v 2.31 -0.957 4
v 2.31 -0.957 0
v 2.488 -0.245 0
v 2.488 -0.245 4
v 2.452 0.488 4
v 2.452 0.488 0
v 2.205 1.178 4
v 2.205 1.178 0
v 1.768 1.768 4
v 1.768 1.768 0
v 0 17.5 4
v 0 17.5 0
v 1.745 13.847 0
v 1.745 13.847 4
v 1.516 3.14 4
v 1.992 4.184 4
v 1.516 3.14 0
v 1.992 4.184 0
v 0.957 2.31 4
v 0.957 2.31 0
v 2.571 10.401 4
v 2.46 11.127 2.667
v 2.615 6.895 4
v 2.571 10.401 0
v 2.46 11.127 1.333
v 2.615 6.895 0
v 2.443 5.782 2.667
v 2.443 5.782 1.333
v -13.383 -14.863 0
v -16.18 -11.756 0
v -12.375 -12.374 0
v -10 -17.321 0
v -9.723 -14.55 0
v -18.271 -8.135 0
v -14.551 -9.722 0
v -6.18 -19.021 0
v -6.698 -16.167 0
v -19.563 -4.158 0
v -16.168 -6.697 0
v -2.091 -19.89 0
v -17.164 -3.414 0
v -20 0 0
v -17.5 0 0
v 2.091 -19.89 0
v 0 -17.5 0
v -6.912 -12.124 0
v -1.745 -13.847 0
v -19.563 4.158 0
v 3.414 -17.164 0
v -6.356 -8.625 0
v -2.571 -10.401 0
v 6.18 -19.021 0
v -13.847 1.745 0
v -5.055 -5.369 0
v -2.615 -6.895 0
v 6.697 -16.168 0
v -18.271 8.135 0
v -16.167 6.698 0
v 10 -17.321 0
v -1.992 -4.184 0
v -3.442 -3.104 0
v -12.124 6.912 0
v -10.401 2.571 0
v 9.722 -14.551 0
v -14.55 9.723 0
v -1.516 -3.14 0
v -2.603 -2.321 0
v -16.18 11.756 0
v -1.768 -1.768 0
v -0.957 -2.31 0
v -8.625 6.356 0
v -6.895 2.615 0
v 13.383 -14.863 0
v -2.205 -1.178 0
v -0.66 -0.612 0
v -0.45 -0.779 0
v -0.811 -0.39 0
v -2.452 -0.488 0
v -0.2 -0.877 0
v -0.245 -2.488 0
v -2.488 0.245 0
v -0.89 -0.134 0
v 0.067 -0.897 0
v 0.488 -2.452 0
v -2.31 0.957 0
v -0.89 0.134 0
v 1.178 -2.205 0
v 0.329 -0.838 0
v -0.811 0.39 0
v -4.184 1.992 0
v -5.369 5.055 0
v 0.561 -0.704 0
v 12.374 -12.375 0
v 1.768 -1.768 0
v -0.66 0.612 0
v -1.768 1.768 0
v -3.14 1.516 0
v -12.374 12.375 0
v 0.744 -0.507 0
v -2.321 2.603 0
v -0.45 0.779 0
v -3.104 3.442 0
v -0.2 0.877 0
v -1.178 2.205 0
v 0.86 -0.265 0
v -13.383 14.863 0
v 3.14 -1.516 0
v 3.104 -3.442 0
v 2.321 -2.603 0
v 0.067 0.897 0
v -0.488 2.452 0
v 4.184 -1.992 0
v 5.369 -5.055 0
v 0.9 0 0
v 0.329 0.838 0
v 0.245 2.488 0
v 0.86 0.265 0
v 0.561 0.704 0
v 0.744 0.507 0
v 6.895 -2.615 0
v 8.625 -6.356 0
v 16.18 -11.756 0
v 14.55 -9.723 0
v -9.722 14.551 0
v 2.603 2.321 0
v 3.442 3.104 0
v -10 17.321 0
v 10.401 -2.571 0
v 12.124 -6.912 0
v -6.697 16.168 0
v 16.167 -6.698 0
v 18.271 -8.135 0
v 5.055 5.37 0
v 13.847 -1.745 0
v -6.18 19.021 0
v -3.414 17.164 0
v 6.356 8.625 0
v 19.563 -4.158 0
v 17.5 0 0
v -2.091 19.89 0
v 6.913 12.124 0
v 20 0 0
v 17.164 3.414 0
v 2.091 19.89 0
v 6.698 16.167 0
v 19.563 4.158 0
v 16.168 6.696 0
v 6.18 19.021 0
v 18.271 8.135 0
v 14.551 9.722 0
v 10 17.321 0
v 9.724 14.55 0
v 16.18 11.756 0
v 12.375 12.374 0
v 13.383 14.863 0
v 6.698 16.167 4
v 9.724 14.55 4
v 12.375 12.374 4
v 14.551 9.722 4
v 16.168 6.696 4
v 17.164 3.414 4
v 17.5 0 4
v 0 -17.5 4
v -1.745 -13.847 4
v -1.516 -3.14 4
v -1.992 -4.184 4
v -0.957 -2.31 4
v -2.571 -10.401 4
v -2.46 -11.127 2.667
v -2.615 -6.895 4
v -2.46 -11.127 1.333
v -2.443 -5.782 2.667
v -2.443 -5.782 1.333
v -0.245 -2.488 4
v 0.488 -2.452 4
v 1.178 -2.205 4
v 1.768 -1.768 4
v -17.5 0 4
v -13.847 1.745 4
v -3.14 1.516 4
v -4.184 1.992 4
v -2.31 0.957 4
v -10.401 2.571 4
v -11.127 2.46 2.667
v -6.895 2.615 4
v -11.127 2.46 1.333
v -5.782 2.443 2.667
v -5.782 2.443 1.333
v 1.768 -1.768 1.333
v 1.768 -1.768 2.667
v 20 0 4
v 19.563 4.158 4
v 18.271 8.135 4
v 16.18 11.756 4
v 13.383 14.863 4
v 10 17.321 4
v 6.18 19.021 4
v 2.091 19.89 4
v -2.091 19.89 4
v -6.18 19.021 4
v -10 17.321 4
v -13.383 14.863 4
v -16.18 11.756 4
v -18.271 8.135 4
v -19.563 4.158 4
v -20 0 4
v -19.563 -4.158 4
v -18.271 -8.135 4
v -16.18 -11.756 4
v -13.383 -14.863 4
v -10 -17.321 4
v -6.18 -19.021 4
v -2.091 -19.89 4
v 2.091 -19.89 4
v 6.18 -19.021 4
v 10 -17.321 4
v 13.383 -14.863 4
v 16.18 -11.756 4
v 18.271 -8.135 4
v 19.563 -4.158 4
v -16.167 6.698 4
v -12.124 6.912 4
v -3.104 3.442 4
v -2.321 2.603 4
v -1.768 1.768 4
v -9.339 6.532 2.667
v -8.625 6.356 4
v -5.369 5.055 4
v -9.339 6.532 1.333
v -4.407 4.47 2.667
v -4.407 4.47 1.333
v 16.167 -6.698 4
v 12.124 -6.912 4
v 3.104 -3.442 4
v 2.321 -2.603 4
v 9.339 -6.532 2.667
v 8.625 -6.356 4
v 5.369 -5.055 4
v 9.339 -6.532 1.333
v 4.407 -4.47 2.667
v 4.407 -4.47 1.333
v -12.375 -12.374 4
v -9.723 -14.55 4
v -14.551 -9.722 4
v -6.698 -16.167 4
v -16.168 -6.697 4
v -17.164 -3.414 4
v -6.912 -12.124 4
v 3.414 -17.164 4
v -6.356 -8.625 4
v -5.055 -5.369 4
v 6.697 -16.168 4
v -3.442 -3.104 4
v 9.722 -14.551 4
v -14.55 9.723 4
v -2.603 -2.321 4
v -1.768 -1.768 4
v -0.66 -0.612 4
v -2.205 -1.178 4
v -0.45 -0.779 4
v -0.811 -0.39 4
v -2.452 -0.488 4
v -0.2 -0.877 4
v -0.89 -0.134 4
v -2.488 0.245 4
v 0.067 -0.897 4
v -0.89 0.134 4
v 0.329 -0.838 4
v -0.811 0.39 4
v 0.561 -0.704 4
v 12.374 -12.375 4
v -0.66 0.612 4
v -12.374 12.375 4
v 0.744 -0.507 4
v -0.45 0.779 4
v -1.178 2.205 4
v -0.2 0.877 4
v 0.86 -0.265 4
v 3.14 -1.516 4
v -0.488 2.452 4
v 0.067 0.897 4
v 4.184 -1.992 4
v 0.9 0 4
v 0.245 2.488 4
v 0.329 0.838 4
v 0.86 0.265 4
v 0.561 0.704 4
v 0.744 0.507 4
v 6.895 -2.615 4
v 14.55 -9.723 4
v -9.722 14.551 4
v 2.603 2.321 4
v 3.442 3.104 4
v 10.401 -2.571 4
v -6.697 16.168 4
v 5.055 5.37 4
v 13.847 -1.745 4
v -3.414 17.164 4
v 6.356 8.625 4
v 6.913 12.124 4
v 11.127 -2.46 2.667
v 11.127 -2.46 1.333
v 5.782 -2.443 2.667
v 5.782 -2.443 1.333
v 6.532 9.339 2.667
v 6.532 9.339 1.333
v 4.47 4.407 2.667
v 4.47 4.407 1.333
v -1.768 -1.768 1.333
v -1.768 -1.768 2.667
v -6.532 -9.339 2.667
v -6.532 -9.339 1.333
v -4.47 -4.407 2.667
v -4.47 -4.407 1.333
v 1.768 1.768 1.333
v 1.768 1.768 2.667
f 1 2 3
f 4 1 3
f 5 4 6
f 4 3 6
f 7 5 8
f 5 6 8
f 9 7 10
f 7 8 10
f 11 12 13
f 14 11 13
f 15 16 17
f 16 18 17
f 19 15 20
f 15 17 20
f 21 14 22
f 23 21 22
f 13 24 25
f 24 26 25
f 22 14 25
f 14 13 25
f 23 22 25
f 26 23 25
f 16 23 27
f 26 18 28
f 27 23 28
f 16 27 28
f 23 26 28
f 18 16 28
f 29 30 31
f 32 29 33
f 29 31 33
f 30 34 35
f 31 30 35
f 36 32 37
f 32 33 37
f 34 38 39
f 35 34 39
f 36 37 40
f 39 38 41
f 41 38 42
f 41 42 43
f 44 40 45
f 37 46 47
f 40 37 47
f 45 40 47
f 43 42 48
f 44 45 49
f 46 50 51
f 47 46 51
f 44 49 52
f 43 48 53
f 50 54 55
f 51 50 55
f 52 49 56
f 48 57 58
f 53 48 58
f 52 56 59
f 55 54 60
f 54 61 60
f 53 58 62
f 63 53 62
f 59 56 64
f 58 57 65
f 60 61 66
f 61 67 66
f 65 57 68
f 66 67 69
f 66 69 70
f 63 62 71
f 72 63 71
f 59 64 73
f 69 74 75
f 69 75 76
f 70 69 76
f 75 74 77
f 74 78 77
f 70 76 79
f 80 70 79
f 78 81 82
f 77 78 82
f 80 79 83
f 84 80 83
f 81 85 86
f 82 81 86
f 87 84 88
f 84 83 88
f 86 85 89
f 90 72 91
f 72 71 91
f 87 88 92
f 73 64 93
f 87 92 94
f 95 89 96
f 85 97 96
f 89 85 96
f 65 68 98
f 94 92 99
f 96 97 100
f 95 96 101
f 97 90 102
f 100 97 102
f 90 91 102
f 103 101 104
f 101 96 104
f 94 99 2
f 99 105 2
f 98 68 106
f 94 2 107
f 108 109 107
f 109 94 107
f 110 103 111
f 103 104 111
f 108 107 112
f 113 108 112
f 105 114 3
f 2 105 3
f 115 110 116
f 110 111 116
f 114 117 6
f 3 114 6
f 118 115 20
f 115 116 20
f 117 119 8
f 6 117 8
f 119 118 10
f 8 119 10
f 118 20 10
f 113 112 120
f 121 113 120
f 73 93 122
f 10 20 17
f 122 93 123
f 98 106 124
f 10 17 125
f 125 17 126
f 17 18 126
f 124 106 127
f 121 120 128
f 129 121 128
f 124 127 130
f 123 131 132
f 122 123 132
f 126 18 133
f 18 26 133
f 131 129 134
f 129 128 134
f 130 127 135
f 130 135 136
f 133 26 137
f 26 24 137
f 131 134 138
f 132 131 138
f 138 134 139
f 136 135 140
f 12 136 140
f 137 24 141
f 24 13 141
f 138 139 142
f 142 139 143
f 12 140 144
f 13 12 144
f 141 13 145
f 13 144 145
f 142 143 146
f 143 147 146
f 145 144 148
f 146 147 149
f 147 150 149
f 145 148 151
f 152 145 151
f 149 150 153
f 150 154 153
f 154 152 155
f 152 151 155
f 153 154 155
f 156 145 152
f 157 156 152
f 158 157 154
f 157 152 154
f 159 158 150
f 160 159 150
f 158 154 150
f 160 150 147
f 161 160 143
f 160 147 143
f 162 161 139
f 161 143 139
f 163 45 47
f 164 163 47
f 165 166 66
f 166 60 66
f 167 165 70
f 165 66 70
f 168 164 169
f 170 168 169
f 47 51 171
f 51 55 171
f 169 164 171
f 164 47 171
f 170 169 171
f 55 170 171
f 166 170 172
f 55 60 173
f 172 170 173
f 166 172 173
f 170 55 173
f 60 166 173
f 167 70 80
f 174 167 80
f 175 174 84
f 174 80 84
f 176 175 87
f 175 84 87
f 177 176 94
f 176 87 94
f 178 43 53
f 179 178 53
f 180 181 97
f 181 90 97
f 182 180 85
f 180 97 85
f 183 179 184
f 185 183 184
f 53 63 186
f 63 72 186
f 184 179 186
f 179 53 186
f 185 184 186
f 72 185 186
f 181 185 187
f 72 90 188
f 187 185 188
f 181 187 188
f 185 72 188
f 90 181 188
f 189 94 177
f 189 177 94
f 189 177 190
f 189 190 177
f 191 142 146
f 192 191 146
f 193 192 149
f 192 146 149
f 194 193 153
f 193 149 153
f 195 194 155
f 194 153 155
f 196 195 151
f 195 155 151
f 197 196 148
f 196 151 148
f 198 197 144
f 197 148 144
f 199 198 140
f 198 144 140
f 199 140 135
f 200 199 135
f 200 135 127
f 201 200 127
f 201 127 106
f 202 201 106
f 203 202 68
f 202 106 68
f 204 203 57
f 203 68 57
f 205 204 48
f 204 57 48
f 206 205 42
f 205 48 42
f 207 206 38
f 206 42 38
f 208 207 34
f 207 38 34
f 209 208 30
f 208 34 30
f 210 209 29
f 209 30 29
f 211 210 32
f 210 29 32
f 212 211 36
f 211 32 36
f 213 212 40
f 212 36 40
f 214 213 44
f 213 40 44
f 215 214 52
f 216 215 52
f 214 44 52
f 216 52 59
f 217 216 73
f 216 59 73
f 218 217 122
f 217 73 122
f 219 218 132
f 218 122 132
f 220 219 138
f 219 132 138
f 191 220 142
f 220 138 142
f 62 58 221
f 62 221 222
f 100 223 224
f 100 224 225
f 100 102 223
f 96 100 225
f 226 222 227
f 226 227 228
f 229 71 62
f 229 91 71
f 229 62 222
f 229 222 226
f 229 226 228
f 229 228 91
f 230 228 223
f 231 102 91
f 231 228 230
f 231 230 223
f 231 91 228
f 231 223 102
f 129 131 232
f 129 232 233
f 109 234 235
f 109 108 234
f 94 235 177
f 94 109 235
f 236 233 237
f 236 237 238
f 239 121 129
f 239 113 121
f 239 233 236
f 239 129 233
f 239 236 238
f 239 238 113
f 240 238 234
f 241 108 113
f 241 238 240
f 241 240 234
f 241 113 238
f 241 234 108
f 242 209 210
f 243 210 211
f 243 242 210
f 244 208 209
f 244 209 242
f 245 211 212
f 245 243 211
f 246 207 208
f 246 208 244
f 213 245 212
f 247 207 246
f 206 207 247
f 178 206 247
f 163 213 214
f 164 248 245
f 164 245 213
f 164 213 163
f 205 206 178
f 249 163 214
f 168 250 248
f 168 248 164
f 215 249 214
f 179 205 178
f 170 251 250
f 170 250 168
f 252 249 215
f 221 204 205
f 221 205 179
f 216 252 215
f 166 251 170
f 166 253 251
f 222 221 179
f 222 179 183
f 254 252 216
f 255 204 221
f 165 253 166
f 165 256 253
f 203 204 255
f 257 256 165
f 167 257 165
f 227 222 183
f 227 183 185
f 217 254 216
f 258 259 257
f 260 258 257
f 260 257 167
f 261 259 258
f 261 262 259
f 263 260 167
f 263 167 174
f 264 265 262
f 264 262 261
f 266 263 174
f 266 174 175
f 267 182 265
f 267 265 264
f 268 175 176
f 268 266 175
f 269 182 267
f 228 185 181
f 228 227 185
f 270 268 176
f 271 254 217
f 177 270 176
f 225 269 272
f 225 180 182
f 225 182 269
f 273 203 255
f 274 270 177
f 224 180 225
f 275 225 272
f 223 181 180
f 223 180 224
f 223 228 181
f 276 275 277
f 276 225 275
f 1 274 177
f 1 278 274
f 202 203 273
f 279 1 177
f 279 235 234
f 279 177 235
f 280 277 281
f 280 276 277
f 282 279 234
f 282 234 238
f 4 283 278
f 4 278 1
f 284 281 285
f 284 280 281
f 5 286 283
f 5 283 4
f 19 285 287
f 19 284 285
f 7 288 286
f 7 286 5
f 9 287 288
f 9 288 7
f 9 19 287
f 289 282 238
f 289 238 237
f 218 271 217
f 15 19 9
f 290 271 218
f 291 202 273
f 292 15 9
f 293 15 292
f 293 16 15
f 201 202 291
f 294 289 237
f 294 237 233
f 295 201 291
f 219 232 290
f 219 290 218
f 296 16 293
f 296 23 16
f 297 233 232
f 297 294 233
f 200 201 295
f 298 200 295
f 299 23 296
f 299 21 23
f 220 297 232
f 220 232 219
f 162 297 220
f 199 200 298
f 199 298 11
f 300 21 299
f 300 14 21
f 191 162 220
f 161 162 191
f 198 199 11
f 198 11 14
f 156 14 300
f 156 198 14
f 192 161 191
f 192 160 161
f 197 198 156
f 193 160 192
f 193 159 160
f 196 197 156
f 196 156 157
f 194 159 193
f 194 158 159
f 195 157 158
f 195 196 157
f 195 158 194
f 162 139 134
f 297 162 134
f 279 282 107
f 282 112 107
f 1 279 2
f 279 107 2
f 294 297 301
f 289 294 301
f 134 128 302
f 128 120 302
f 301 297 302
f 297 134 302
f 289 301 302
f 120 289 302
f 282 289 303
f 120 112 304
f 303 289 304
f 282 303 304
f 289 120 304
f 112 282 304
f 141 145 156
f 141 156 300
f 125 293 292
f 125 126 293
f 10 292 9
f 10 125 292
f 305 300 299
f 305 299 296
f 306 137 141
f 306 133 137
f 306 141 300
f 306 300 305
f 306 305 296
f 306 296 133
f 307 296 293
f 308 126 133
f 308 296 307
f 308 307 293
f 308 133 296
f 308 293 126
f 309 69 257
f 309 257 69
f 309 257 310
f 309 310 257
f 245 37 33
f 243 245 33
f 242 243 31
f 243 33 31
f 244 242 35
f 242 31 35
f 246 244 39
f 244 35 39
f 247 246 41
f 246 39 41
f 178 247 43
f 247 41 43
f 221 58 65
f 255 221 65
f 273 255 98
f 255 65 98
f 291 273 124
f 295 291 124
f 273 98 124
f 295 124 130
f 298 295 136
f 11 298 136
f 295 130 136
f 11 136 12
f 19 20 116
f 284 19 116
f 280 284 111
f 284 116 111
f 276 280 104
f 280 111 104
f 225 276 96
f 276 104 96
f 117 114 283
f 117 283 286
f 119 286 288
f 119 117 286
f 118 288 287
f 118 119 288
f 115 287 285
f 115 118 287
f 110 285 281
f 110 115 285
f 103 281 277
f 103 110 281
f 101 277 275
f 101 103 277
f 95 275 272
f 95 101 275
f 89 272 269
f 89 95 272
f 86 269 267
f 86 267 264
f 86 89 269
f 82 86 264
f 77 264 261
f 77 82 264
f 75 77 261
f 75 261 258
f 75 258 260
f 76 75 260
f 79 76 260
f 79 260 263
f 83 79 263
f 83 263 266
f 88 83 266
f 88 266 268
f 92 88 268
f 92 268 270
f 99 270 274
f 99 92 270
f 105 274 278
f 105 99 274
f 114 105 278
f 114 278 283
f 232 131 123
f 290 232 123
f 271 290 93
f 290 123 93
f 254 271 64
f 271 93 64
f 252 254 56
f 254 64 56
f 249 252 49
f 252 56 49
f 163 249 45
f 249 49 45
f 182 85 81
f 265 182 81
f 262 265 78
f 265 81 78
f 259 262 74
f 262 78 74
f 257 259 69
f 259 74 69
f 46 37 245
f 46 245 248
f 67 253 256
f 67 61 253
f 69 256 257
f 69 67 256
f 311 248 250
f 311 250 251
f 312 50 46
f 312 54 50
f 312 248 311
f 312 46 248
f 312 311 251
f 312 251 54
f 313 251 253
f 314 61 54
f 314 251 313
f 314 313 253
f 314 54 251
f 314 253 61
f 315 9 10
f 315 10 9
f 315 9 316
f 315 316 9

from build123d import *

# Parameters (mm, degrees)
F0_R     = 20
F0_R_2   = 0.9
F1_DEPTH = 4


with BuildPart() as f1:
    # F0 (on Top) → F1 (new body)
    with BuildSketch(Plane.XY):
        Circle(F0_R)
        with BuildLine():
            ThreePointArc((-16.1673680712, 6.6982243655), (-9.7219101416, 14.5510983502), (0, 17.5))
            add(Edge.make_bspline(
                [(0, 17.5), (4.0351947292, 10.8956713768), (2.8402573141, 4.5637440123), (0.9567085809, 2.3096988313)],
                knots=[0, 0, 0, 0, 0.6747802814, 0.6747802814, 0.6747802814, 0.6747802814], degree=3))
            add(Edge.make_bspline(
                [(1.05334234, 1.483872858), (1.0137768965, 1.7486550509), (0.9849575618, 2.0237015142), (0.9567085809, 2.3096988313)],
                knots=[0.9279449305, 0.9279449305, 0.9279449305, 0.9279449305, 1, 1, 1, 1], degree=3))
            add(Edge.make_bspline(
                [(1.7677669525, 1.7677669535), (1.7677118309, 1.7677381162), (1.5223929609, 1.6394048238), (1.2852910821, 1.5468737836), (1.0533423393, 1.4838728598)],
                knots=[0.6747713742, 0.6747713742, 0.6747713742, 0.6747713742, 0.6747856641, 0.7383691109, 0.7383691109, 0.7383691109, 0.7383691109], degree=3))
            add(Edge.make_bspline(
                [(1.76803561, 1.7679075162), (1.7679460564, 1.7678606572), (1.7678565039, 1.7678138029), (1.7677669525, 1.7677669535)],
                knots=[0.6747481586, 0.6747481586, 0.6747481586, 0.6747481586, 0.6747713742, 0.6747713742, 0.6747713742, 0.6747713742], degree=3))
            add(Edge.make_bspline(
                [(6.6984395879, 16.1672789018), (7.8983091219, 8.521720501), (4.3708601286, 3.1298383292), (1.76803561, 1.7679075162)],
                knots=[0, 0, 0, 0, 0.6747481586, 0.6747481586, 0.6747481586, 0.6747481586], degree=3))
            ThreePointArc((6.6984395879, 16.1672789018), (14.5511630598, 9.721813288), (17.5, 0))
            add(Edge.make_bspline(
                [(17.5, 0), (10.8956713768, -4.0351947292), (4.5637440123, -2.8402573141), (2.3096988313, -0.9567085809)],
                knots=[0, 0, 0, 0, 0.6747802814, 0.6747802814, 0.6747802814, 0.6747802814], degree=3))
            add(Edge.make_bspline(
                [(1.4839305002, -1.0533337269), (1.7486949687, -1.0137727139), (2.0237222677, -0.9849555119), (2.3096988313, -0.9567085809)],
                knots=[0.9279501592, 0.9279501592, 0.9279501592, 0.9279501592, 1, 1, 1, 1], degree=3))
            add(Edge.make_bspline(
                [(1.767766953, -1.767766953), (1.7677424454, -1.767720101), (1.639424724, -1.5224005371), (1.5469125425, -1.2852951635), (1.483930502, -1.0533337262)],
                knots=[0.6747683451, 0.6747683451, 0.6747683451, 0.6747683451, 0.674780491, 0.7383651842, 0.7383651842, 0.7383651842, 0.7383651842], degree=3))
            add(Edge.make_bspline(
                [(1.7679075011, -1.7680356179), (1.767860647, -1.7679460618), (1.7678137976, -1.7678565068), (1.767766953, -1.767766953)],
                knots=[0.6747451292, 0.6747451292, 0.6747451292, 0.6747451292, 0.6747683451, 0.6747683451, 0.6747683451, 0.6747683451], degree=3))
            add(Edge.make_bspline(
                [(16.1673680713, -6.6982243654), (8.5218439975, -7.8980885198), (3.1296734519, -4.3708895859), (1.7679075011, -1.7680356179)],
                knots=[0, 0, 0, 0, 0.6747451292, 0.6747451292, 0.6747451292, 0.6747451292], degree=3))
            ThreePointArc((16.1673680713, -6.6982243654), (9.7219101417, -14.5510983502), (0, -17.5))
            add(Edge.make_bspline(
                [(0, -17.5), (-4.0351947292, -10.8956713768), (-2.8402573141, -4.5637440123), (-0.9567085809, -2.3096988313)],
                knots=[0, 0, 0, 0, 0.6747802814, 0.6747802814, 0.6747802814, 0.6747802814], degree=3))
            add(Edge.make_bspline(
                [(-1.0533337269, -1.4839305003), (-1.0137727139, -1.7486949687), (-0.9849555119, -2.0237222677), (-0.9567085809, -2.3096988313)],
                knots=[0.9279501592, 0.9279501592, 0.9279501592, 0.9279501592, 1, 1, 1, 1], degree=3))
            add(Edge.make_bspline(
                [(-1.767766953, -1.767766953), (-1.7677201011, -1.7677424454), (-1.5224005372, -1.639424724), (-1.2852951635, -1.5469125425), (-1.0533337262, -1.483930502)],
                knots=[0.6747683451, 0.6747683451, 0.6747683451, 0.6747683451, 0.674780491, 0.7383651842, 0.7383651842, 0.7383651842, 0.7383651842], degree=3))
            add(Edge.make_bspline(
                [(-1.7680356179, -1.7679075011), (-1.7679460618, -1.767860647), (-1.7678565068, -1.7678137976), (-1.767766953, -1.767766953)],
                knots=[0.6747451293, 0.6747451293, 0.6747451293, 0.6747451293, 0.6747683451, 0.6747683451, 0.6747683451, 0.6747683451], degree=3))
            add(Edge.make_bspline(
                [(-6.6982243654, -16.1673680712), (-7.8980885199, -8.5218439973), (-4.3708895859, -3.1296734518), (-1.7680356179, -1.7679075011)],
                knots=[0, 0, 0, 0, 0.6747451293, 0.6747451293, 0.6747451293, 0.6747451293], degree=3))
            ThreePointArc((-6.6982243654, -16.1673680712), (-14.5510983502, -9.7219101417), (-17.5, 0))
            add(Edge.make_bspline(
                [(-17.5, 0), (-10.8956713768, 4.0351947292), (-4.5637440123, 2.8402573141), (-2.3096988313, 0.9567085809)],
                knots=[0, 0, 0, 0, 0.6747802814, 0.6747802814, 0.6747802814, 0.6747802814], degree=3))
            add(Edge.make_bspline(
                [(-1.4839305003, 1.0533337269), (-1.7486949687, 1.0137727139), (-2.0237222677, 0.9849555119), (-2.3096988313, 0.9567085809)],
                knots=[0.9279501592, 0.9279501592, 0.9279501592, 0.9279501592, 1, 1, 1, 1], degree=3))
            add(Edge.make_bspline(
                [(-1.767766953, 1.767766953), (-1.7677424454, 1.7677201011), (-1.6394247241, 1.5224005372), (-1.5469125425, 1.2852951636), (-1.4839305021, 1.0533337262)],
                knots=[0.6747683451, 0.6747683451, 0.6747683451, 0.6747683451, 0.674780491, 0.7383651842, 0.7383651842, 0.7383651842, 0.7383651842], degree=3))
            add(Edge.make_bspline(
                [(-16.1673680712, 6.6982243655), (-8.5215809386, 7.8981298036), (-3.1293023988, 4.3706468604), (-1.767766953, 1.767766953)],
                knots=[0, 0, 0, 0, 0.6747683451, 0.6747683451, 0.6747683451, 0.6747683451], degree=3))
        make_face(mode=Mode.SUBTRACT)
        with BuildLine():
            add(Edge.make_bspline(
                [(1.05334234, 1.483872858), (1.0137768965, 1.7486550509), (0.9849575618, 2.0237015142), (0.9567085809, 2.3096988313)],
                knots=[0.9279449305, 0.9279449305, 0.9279449305, 0.9279449305, 1, 1, 1, 1], degree=3))
            add(Edge.make_bspline(
                [(0.9567085809, 2.3096988313), (0.5925556194, 1.873916516), (0.202663868, 1.5905565475), (-0.2170414882, 1.3992266891)],
                knots=[0.6747802814, 0.6747802814, 0.6747802814, 0.6747802814, 0.8052378764, 0.8052378764, 0.8052378764, 0.8052378764], degree=3))
            add(Edge.make_bspline(
                [(1.0533423393, 1.4838728598), (0.6188058723, 1.3658459262), (0.2021683226, 1.3513874939), (-0.2170414882, 1.3992266891)],
                knots=[0.7383691109, 0.7383691109, 0.7383691109, 0.7383691109, 0.8574873522, 0.8574873522, 0.8574873522, 0.8574873522], degree=3))
        make_face()
        with BuildLine():
            add(Edge.make_bspline(
                [(0.9567085809, 2.3096988313), (0.5925556194, 1.873916516), (0.202663868, 1.5905565475), (-0.2170414882, 1.3992266891)],
                knots=[0.6747802814, 0.6747802814, 0.6747802814, 0.6747802814, 0.8052378764, 0.8052378764, 0.8052378764, 0.8052378764], degree=3))
            ThreePointArc((0.9567085809, 2.3096988313), (-0.4877258051, 2.451963201), (-1.767766953, 1.767766953))
            add(Edge.make_bspline(
                [(-0.2170414882, 1.3992266891), (-0.7185826414, 1.4564613351), (-1.2238056379, 1.6028665997), (-1.767766953, 1.767766953)],
                knots=[0.8574873522, 0.8574873522, 0.8574873522, 0.8574873522, 1, 1, 1, 1], degree=3))
        make_face()
        with BuildLine():
            add(Edge.make_bspline(
                [(-0.2170414882, 1.3992266891), (-0.7185826414, 1.4564613351), (-1.2238056379, 1.6028665997), (-1.767766953, 1.767766953)],
                knots=[0.8574873522, 0.8574873522, 0.8574873522, 0.8574873522, 1, 1, 1, 1], degree=3))
            add(Edge.make_bspline(
                [(-1.767766953, 1.767766953), (-1.7677424454, 1.7677201011), (-1.6394247241, 1.5224005372), (-1.5469125425, 1.2852951636), (-1.4839305021, 1.0533337262)],
                knots=[0.6747683451, 0.6747683451, 0.6747683451, 0.6747683451, 0.674780491, 0.7383651842, 0.7383651842, 0.7383651842, 0.7383651842], degree=3))
            add(Edge.make_bspline(
                [(-0.2170414882, 1.3992266891), (-0.6118287934, 1.21925615), (-1.0329947036, 1.1207123938), (-1.4839305003, 1.0533337269)],
                knots=[0.8052378764, 0.8052378764, 0.8052378764, 0.8052378764, 0.9279501592, 0.9279501592, 0.9279501592, 0.9279501592], degree=3))
        make_face()
        with BuildLine():
            add(Edge.make_bspline(
                [(1.0533423393, 1.4838728598), (0.6188058723, 1.3658459262), (0.2021683226, 1.3513874939), (-0.2170414882, 1.3992266891)],
                knots=[0.7383691109, 0.7383691109, 0.7383691109, 0.7383691109, 0.8574873522, 0.8574873522, 0.8574873522, 0.8574873522], degree=3))
            add(Edge.make_bspline(
                [(-0.2170414882, 1.3992266891), (-0.6118287934, 1.21925615), (-1.0329947036, 1.1207123938), (-1.4839305003, 1.0533337269)],
                knots=[0.8052378764, 0.8052378764, 0.8052378764, 0.8052378764, 0.9279501592, 0.9279501592, 0.9279501592, 0.9279501592], degree=3))
            add(Edge.make_bspline(
                [(-1.4839305021, 1.0533337262), (-1.3659750292, 0.6189063747), (-1.3515357612, 0.2023627588), (-1.3993629137, -0.2167427021)],
                knots=[0.7383651842, 0.7383651842, 0.7383651842, 0.7383651842, 0.8574493311, 0.8574493311, 0.8574493311, 0.8574493311], degree=3))
            add(Edge.make_bspline(
                [(-1.3993629137, -0.2167427021), (-1.2193058732, -0.6116162916), (-1.1207293921, -1.0328809414), (-1.0533337269, -1.4839305003)],
                knots=[0.8052069185, 0.8052069185, 0.8052069185, 0.8052069185, 0.9279501592, 0.9279501592, 0.9279501592, 0.9279501592], degree=3))
            add(Edge.make_bspline(
                [(-1.0533337262, -1.483930502), (-0.6189063746, -1.3659750292), (-0.2023627587, -1.3515357612), (0.2167427022, -1.3993629136)],
                knots=[0.7383651842, 0.7383651842, 0.7383651842, 0.7383651842, 0.8574493311, 0.8574493311, 0.8574493311, 0.8574493311], degree=3))
            add(Edge.make_bspline(
                [(0.2167427022, -1.3993629136), (0.6116162917, -1.2193058732), (1.0328809414, -1.1207293921), (1.4839305002, -1.0533337269)],
                knots=[0.8052069185, 0.8052069185, 0.8052069185, 0.8052069185, 0.9279501592, 0.9279501592, 0.9279501592, 0.9279501592], degree=3))
            add(Edge.make_bspline(
                [(1.483930502, -1.0533337262), (1.3659750291, -0.6189063746), (1.3515357611, -0.2023627586), (1.3993629136, 0.2167427023)],
                knots=[0.7383651842, 0.7383651842, 0.7383651842, 0.7383651842, 0.8574493311, 0.8574493311, 0.8574493311, 0.8574493311], degree=3))
            add(Edge.make_bspline(
                [(1.3993629136, 0.2167427023), (1.2193135434, 0.6115994707), (1.1207377907, 1.0328450508), (1.05334234, 1.483872858)],
                knots=[0.8052069185, 0.8052069185, 0.8052069185, 0.8052069185, 0.9279449305, 0.9279449305, 0.9279449305, 0.9279449305], degree=3))
        make_face()
        Circle(F0_R_2, mode=Mode.SUBTRACT)
        with BuildLine():
            add(Edge.make_bspline(
                [(1.7677669525, 1.7677669535), (1.7677118309, 1.7677381162), (1.5223929609, 1.6394048238), (1.2852910821, 1.5468737836), (1.0533423393, 1.4838728598)],
                knots=[0.6747713742, 0.6747713742, 0.6747713742, 0.6747713742, 0.6747856641, 0.7383691109, 0.7383691109, 0.7383691109, 0.7383691109], degree=3))
            add(Edge.make_bspline(
                [(1.3993629136, 0.2167427023), (1.2193135434, 0.6115994707), (1.1207377907, 1.0328450508), (1.05334234, 1.483872858)],
                knots=[0.8052069185, 0.8052069185, 0.8052069185, 0.8052069185, 0.9279449305, 0.9279449305, 0.9279449305, 0.9279449305], degree=3))
            add(Edge.make_bspline(
                [(1.3993629136, 0.2167427023), (1.45660379, 0.7183398629), (1.6030349201, 1.2236066033), (1.7679404268, 1.7675934622)],
                knots=[0.8574493311, 0.8574493311, 0.8574493311, 0.8574493311, 0.9999725754, 0.9999725754, 0.9999725754, 0.9999725754], degree=3))
            ThreePointArc((1.7679404268, 1.7675934622), (1.7678536918, 1.7676802099), (1.7677669525, 1.7677669535))
        make_face()
        with BuildLine():
            add(Edge.make_bspline(
                [(-1.4839305021, 1.0533337262), (-1.3659750292, 0.6189063747), (-1.3515357612, 0.2023627588), (-1.3993629137, -0.2167427021)],
                knots=[0.7383651842, 0.7383651842, 0.7383651842, 0.7383651842, 0.8574493311, 0.8574493311, 0.8574493311, 0.8574493311], degree=3))
            add(Edge.make_bspline(
                [(-1.4839305003, 1.0533337269), (-1.7486949687, 1.0137727139), (-2.0237222677, 0.9849555119), (-2.3096988313, 0.9567085809)],
                knots=[0.9279501592, 0.9279501592, 0.9279501592, 0.9279501592, 1, 1, 1, 1], degree=3))
            add(Edge.make_bspline(
                [(-2.3096988313, 0.9567085809), (-1.8740199281, 0.5926420338), (-1.59069104, 0.2028489109), (-1.3993629137, -0.2167427021)],
                knots=[0.6747802814, 0.6747802814, 0.6747802814, 0.6747802814, 0.8052069185, 0.8052069185, 0.8052069185, 0.8052069185], degree=3))
        make_face()
        with BuildLine():
            add(Edge.make_bspline(
                [(1.3993629136, 0.2167427023), (1.45660379, 0.7183398629), (1.6030349201, 1.2236066033), (1.7679404268, 1.7675934622)],
                knots=[0.8574493311, 0.8574493311, 0.8574493311, 0.8574493311, 0.9999725754, 0.9999725754, 0.9999725754, 0.9999725754], degree=3))
            add(Edge.make_bspline(
                [(2.3096988313, -0.9567085809), (1.874019928, -0.5926420337), (1.5906910399, -0.2028489108), (1.3993629136, 0.2167427023)],
                knots=[0.6747802814, 0.6747802814, 0.6747802814, 0.6747802814, 0.8052069185, 0.8052069185, 0.8052069185, 0.8052069185], degree=3))
            ThreePointArc((2.3096988313, -0.9567085809), (2.4519871299, 0.487605491), (1.7679404268, 1.7675934622))
        make_face()
        with BuildLine():
            add(Edge.make_bspline(
                [(2.3096988313, -0.9567085809), (1.874019928, -0.5926420337), (1.5906910399, -0.2028489108), (1.3993629136, 0.2167427023)],
                knots=[0.6747802814, 0.6747802814, 0.6747802814, 0.6747802814, 0.8052069185, 0.8052069185, 0.8052069185, 0.8052069185], degree=3))
            add(Edge.make_bspline(
                [(1.483930502, -1.0533337262), (1.3659750291, -0.6189063746), (1.3515357611, -0.2023627586), (1.3993629136, 0.2167427023)],
                knots=[0.7383651842, 0.7383651842, 0.7383651842, 0.7383651842, 0.8574493311, 0.8574493311, 0.8574493311, 0.8574493311], degree=3))
            add(Edge.make_bspline(
                [(1.4839305002, -1.0533337269), (1.7486949687, -1.0137727139), (2.0237222677, -0.9849555119), (2.3096988313, -0.9567085809)],
                knots=[0.9279501592, 0.9279501592, 0.9279501592, 0.9279501592, 1, 1, 1, 1], degree=3))
        make_face()
        with BuildLine():
            add(Edge.make_bspline(
                [(-2.3096988313, 0.9567085809), (-1.8740199281, 0.5926420338), (-1.59069104, 0.2028489109), (-1.3993629137, -0.2167427021)],
                knots=[0.6747802814, 0.6747802814, 0.6747802814, 0.6747802814, 0.8052069185, 0.8052069185, 0.8052069185, 0.8052069185], degree=3))
            ThreePointArc((-2.3096988313, 0.9567085809), (-2.4519871299, -0.4876054909), (-1.7679404269, -1.767593462))
            add(Edge.make_bspline(
                [(-1.3993629137, -0.2167427021), (-1.4566037901, -0.7183398627), (-1.6030349202, -1.2236066032), (-1.7679404269, -1.767593462)],
                knots=[0.8574493311, 0.8574493311, 0.8574493311, 0.8574493311, 0.9999725754, 0.9999725754, 0.9999725754, 0.9999725754], degree=3))
        make_face()
        with BuildLine():
            add(Edge.make_bspline(
                [(-1.3993629137, -0.2167427021), (-1.2193058732, -0.6116162916), (-1.1207293921, -1.0328809414), (-1.0533337269, -1.4839305003)],
                knots=[0.8052069185, 0.8052069185, 0.8052069185, 0.8052069185, 0.9279501592, 0.9279501592, 0.9279501592, 0.9279501592], degree=3))
            add(Edge.make_bspline(
                [(-1.3993629137, -0.2167427021), (-1.4566037901, -0.7183398627), (-1.6030349202, -1.2236066032), (-1.7679404269, -1.767593462)],
                knots=[0.8574493311, 0.8574493311, 0.8574493311, 0.8574493311, 0.9999725754, 0.9999725754, 0.9999725754, 0.9999725754], degree=3))
            ThreePointArc((-1.7679404269, -1.767593462), (-1.7678536921, -1.7676802097), (-1.767766953, -1.767766953))
            add(Edge.make_bspline(
                [(-1.767766953, -1.767766953), (-1.7677201011, -1.7677424454), (-1.5224005372, -1.639424724), (-1.2852951635, -1.5469125425), (-1.0533337262, -1.483930502)],
                knots=[0.6747683451, 0.6747683451, 0.6747683451, 0.6747683451, 0.674780491, 0.7383651842, 0.7383651842, 0.7383651842, 0.7383651842], degree=3))
        make_face()
        with BuildLine():
            add(Edge.make_bspline(
                [(1.767766953, -1.767766953), (1.7677424454, -1.767720101), (1.639424724, -1.5224005371), (1.5469125425, -1.2852951635), (1.483930502, -1.0533337262)],
                knots=[0.6747683451, 0.6747683451, 0.6747683451, 0.6747683451, 0.674780491, 0.7383651842, 0.7383651842, 0.7383651842, 0.7383651842], degree=3))
            add(Edge.make_bspline(
                [(0.2167427022, -1.3993629136), (0.6116162917, -1.2193058732), (1.0328809414, -1.1207293921), (1.4839305002, -1.0533337269)],
                knots=[0.8052069185, 0.8052069185, 0.8052069185, 0.8052069185, 0.9279501592, 0.9279501592, 0.9279501592, 0.9279501592], degree=3))
            add(Edge.make_bspline(
                [(0.2167427022, -1.3993629136), (0.7183398628, -1.45660379), (1.2236066033, -1.6030349201), (1.7675934621, -1.7679404269)],
                knots=[0.8574493311, 0.8574493311, 0.8574493311, 0.8574493311, 0.9999725754, 0.9999725754, 0.9999725754, 0.9999725754], degree=3))
            ThreePointArc((1.7675934621, -1.7679404269), (1.7676802097, -1.767853692), (1.767766953, -1.767766953))
        make_face()
        with BuildLine():
            add(Edge.make_bspline(
                [(-1.0533337262, -1.483930502), (-0.6189063746, -1.3659750292), (-0.2023627587, -1.3515357612), (0.2167427022, -1.3993629136)],
                knots=[0.7383651842, 0.7383651842, 0.7383651842, 0.7383651842, 0.8574493311, 0.8574493311, 0.8574493311, 0.8574493311], degree=3))
            add(Edge.make_bspline(
                [(-1.0533337269, -1.4839305003), (-1.0137727139, -1.7486949687), (-0.9849555119, -2.0237222677), (-0.9567085809, -2.3096988313)],
                knots=[0.9279501592, 0.9279501592, 0.9279501592, 0.9279501592, 1, 1, 1, 1], degree=3))
            add(Edge.make_bspline(
                [(-0.9567085809, -2.3096988313), (-0.5926420337, -1.8740199281), (-0.2028489108, -1.59069104), (0.2167427022, -1.3993629136)],
                knots=[0.6747802814, 0.6747802814, 0.6747802814, 0.6747802814, 0.8052069185, 0.8052069185, 0.8052069185, 0.8052069185], degree=3))
        make_face()
        with BuildLine():
            add(Edge.make_bspline(
                [(0.2167427022, -1.3993629136), (0.7183398628, -1.45660379), (1.2236066033, -1.6030349201), (1.7675934621, -1.7679404269)],
                knots=[0.8574493311, 0.8574493311, 0.8574493311, 0.8574493311, 0.9999725754, 0.9999725754, 0.9999725754, 0.9999725754], degree=3))
            add(Edge.make_bspline(
                [(-0.9567085809, -2.3096988313), (-0.5926420337, -1.8740199281), (-0.2028489108, -1.59069104), (0.2167427022, -1.3993629136)],
                knots=[0.6747802814, 0.6747802814, 0.6747802814, 0.6747802814, 0.8052069185, 0.8052069185, 0.8052069185, 0.8052069185], degree=3))
            ThreePointArc((-0.9567085809, -2.3096988313), (0.487605491, -2.4519871299), (1.7675934621, -1.7679404269))
        make_face()
    extrude(amount=F1_DEPTH)


solid = f1.part
